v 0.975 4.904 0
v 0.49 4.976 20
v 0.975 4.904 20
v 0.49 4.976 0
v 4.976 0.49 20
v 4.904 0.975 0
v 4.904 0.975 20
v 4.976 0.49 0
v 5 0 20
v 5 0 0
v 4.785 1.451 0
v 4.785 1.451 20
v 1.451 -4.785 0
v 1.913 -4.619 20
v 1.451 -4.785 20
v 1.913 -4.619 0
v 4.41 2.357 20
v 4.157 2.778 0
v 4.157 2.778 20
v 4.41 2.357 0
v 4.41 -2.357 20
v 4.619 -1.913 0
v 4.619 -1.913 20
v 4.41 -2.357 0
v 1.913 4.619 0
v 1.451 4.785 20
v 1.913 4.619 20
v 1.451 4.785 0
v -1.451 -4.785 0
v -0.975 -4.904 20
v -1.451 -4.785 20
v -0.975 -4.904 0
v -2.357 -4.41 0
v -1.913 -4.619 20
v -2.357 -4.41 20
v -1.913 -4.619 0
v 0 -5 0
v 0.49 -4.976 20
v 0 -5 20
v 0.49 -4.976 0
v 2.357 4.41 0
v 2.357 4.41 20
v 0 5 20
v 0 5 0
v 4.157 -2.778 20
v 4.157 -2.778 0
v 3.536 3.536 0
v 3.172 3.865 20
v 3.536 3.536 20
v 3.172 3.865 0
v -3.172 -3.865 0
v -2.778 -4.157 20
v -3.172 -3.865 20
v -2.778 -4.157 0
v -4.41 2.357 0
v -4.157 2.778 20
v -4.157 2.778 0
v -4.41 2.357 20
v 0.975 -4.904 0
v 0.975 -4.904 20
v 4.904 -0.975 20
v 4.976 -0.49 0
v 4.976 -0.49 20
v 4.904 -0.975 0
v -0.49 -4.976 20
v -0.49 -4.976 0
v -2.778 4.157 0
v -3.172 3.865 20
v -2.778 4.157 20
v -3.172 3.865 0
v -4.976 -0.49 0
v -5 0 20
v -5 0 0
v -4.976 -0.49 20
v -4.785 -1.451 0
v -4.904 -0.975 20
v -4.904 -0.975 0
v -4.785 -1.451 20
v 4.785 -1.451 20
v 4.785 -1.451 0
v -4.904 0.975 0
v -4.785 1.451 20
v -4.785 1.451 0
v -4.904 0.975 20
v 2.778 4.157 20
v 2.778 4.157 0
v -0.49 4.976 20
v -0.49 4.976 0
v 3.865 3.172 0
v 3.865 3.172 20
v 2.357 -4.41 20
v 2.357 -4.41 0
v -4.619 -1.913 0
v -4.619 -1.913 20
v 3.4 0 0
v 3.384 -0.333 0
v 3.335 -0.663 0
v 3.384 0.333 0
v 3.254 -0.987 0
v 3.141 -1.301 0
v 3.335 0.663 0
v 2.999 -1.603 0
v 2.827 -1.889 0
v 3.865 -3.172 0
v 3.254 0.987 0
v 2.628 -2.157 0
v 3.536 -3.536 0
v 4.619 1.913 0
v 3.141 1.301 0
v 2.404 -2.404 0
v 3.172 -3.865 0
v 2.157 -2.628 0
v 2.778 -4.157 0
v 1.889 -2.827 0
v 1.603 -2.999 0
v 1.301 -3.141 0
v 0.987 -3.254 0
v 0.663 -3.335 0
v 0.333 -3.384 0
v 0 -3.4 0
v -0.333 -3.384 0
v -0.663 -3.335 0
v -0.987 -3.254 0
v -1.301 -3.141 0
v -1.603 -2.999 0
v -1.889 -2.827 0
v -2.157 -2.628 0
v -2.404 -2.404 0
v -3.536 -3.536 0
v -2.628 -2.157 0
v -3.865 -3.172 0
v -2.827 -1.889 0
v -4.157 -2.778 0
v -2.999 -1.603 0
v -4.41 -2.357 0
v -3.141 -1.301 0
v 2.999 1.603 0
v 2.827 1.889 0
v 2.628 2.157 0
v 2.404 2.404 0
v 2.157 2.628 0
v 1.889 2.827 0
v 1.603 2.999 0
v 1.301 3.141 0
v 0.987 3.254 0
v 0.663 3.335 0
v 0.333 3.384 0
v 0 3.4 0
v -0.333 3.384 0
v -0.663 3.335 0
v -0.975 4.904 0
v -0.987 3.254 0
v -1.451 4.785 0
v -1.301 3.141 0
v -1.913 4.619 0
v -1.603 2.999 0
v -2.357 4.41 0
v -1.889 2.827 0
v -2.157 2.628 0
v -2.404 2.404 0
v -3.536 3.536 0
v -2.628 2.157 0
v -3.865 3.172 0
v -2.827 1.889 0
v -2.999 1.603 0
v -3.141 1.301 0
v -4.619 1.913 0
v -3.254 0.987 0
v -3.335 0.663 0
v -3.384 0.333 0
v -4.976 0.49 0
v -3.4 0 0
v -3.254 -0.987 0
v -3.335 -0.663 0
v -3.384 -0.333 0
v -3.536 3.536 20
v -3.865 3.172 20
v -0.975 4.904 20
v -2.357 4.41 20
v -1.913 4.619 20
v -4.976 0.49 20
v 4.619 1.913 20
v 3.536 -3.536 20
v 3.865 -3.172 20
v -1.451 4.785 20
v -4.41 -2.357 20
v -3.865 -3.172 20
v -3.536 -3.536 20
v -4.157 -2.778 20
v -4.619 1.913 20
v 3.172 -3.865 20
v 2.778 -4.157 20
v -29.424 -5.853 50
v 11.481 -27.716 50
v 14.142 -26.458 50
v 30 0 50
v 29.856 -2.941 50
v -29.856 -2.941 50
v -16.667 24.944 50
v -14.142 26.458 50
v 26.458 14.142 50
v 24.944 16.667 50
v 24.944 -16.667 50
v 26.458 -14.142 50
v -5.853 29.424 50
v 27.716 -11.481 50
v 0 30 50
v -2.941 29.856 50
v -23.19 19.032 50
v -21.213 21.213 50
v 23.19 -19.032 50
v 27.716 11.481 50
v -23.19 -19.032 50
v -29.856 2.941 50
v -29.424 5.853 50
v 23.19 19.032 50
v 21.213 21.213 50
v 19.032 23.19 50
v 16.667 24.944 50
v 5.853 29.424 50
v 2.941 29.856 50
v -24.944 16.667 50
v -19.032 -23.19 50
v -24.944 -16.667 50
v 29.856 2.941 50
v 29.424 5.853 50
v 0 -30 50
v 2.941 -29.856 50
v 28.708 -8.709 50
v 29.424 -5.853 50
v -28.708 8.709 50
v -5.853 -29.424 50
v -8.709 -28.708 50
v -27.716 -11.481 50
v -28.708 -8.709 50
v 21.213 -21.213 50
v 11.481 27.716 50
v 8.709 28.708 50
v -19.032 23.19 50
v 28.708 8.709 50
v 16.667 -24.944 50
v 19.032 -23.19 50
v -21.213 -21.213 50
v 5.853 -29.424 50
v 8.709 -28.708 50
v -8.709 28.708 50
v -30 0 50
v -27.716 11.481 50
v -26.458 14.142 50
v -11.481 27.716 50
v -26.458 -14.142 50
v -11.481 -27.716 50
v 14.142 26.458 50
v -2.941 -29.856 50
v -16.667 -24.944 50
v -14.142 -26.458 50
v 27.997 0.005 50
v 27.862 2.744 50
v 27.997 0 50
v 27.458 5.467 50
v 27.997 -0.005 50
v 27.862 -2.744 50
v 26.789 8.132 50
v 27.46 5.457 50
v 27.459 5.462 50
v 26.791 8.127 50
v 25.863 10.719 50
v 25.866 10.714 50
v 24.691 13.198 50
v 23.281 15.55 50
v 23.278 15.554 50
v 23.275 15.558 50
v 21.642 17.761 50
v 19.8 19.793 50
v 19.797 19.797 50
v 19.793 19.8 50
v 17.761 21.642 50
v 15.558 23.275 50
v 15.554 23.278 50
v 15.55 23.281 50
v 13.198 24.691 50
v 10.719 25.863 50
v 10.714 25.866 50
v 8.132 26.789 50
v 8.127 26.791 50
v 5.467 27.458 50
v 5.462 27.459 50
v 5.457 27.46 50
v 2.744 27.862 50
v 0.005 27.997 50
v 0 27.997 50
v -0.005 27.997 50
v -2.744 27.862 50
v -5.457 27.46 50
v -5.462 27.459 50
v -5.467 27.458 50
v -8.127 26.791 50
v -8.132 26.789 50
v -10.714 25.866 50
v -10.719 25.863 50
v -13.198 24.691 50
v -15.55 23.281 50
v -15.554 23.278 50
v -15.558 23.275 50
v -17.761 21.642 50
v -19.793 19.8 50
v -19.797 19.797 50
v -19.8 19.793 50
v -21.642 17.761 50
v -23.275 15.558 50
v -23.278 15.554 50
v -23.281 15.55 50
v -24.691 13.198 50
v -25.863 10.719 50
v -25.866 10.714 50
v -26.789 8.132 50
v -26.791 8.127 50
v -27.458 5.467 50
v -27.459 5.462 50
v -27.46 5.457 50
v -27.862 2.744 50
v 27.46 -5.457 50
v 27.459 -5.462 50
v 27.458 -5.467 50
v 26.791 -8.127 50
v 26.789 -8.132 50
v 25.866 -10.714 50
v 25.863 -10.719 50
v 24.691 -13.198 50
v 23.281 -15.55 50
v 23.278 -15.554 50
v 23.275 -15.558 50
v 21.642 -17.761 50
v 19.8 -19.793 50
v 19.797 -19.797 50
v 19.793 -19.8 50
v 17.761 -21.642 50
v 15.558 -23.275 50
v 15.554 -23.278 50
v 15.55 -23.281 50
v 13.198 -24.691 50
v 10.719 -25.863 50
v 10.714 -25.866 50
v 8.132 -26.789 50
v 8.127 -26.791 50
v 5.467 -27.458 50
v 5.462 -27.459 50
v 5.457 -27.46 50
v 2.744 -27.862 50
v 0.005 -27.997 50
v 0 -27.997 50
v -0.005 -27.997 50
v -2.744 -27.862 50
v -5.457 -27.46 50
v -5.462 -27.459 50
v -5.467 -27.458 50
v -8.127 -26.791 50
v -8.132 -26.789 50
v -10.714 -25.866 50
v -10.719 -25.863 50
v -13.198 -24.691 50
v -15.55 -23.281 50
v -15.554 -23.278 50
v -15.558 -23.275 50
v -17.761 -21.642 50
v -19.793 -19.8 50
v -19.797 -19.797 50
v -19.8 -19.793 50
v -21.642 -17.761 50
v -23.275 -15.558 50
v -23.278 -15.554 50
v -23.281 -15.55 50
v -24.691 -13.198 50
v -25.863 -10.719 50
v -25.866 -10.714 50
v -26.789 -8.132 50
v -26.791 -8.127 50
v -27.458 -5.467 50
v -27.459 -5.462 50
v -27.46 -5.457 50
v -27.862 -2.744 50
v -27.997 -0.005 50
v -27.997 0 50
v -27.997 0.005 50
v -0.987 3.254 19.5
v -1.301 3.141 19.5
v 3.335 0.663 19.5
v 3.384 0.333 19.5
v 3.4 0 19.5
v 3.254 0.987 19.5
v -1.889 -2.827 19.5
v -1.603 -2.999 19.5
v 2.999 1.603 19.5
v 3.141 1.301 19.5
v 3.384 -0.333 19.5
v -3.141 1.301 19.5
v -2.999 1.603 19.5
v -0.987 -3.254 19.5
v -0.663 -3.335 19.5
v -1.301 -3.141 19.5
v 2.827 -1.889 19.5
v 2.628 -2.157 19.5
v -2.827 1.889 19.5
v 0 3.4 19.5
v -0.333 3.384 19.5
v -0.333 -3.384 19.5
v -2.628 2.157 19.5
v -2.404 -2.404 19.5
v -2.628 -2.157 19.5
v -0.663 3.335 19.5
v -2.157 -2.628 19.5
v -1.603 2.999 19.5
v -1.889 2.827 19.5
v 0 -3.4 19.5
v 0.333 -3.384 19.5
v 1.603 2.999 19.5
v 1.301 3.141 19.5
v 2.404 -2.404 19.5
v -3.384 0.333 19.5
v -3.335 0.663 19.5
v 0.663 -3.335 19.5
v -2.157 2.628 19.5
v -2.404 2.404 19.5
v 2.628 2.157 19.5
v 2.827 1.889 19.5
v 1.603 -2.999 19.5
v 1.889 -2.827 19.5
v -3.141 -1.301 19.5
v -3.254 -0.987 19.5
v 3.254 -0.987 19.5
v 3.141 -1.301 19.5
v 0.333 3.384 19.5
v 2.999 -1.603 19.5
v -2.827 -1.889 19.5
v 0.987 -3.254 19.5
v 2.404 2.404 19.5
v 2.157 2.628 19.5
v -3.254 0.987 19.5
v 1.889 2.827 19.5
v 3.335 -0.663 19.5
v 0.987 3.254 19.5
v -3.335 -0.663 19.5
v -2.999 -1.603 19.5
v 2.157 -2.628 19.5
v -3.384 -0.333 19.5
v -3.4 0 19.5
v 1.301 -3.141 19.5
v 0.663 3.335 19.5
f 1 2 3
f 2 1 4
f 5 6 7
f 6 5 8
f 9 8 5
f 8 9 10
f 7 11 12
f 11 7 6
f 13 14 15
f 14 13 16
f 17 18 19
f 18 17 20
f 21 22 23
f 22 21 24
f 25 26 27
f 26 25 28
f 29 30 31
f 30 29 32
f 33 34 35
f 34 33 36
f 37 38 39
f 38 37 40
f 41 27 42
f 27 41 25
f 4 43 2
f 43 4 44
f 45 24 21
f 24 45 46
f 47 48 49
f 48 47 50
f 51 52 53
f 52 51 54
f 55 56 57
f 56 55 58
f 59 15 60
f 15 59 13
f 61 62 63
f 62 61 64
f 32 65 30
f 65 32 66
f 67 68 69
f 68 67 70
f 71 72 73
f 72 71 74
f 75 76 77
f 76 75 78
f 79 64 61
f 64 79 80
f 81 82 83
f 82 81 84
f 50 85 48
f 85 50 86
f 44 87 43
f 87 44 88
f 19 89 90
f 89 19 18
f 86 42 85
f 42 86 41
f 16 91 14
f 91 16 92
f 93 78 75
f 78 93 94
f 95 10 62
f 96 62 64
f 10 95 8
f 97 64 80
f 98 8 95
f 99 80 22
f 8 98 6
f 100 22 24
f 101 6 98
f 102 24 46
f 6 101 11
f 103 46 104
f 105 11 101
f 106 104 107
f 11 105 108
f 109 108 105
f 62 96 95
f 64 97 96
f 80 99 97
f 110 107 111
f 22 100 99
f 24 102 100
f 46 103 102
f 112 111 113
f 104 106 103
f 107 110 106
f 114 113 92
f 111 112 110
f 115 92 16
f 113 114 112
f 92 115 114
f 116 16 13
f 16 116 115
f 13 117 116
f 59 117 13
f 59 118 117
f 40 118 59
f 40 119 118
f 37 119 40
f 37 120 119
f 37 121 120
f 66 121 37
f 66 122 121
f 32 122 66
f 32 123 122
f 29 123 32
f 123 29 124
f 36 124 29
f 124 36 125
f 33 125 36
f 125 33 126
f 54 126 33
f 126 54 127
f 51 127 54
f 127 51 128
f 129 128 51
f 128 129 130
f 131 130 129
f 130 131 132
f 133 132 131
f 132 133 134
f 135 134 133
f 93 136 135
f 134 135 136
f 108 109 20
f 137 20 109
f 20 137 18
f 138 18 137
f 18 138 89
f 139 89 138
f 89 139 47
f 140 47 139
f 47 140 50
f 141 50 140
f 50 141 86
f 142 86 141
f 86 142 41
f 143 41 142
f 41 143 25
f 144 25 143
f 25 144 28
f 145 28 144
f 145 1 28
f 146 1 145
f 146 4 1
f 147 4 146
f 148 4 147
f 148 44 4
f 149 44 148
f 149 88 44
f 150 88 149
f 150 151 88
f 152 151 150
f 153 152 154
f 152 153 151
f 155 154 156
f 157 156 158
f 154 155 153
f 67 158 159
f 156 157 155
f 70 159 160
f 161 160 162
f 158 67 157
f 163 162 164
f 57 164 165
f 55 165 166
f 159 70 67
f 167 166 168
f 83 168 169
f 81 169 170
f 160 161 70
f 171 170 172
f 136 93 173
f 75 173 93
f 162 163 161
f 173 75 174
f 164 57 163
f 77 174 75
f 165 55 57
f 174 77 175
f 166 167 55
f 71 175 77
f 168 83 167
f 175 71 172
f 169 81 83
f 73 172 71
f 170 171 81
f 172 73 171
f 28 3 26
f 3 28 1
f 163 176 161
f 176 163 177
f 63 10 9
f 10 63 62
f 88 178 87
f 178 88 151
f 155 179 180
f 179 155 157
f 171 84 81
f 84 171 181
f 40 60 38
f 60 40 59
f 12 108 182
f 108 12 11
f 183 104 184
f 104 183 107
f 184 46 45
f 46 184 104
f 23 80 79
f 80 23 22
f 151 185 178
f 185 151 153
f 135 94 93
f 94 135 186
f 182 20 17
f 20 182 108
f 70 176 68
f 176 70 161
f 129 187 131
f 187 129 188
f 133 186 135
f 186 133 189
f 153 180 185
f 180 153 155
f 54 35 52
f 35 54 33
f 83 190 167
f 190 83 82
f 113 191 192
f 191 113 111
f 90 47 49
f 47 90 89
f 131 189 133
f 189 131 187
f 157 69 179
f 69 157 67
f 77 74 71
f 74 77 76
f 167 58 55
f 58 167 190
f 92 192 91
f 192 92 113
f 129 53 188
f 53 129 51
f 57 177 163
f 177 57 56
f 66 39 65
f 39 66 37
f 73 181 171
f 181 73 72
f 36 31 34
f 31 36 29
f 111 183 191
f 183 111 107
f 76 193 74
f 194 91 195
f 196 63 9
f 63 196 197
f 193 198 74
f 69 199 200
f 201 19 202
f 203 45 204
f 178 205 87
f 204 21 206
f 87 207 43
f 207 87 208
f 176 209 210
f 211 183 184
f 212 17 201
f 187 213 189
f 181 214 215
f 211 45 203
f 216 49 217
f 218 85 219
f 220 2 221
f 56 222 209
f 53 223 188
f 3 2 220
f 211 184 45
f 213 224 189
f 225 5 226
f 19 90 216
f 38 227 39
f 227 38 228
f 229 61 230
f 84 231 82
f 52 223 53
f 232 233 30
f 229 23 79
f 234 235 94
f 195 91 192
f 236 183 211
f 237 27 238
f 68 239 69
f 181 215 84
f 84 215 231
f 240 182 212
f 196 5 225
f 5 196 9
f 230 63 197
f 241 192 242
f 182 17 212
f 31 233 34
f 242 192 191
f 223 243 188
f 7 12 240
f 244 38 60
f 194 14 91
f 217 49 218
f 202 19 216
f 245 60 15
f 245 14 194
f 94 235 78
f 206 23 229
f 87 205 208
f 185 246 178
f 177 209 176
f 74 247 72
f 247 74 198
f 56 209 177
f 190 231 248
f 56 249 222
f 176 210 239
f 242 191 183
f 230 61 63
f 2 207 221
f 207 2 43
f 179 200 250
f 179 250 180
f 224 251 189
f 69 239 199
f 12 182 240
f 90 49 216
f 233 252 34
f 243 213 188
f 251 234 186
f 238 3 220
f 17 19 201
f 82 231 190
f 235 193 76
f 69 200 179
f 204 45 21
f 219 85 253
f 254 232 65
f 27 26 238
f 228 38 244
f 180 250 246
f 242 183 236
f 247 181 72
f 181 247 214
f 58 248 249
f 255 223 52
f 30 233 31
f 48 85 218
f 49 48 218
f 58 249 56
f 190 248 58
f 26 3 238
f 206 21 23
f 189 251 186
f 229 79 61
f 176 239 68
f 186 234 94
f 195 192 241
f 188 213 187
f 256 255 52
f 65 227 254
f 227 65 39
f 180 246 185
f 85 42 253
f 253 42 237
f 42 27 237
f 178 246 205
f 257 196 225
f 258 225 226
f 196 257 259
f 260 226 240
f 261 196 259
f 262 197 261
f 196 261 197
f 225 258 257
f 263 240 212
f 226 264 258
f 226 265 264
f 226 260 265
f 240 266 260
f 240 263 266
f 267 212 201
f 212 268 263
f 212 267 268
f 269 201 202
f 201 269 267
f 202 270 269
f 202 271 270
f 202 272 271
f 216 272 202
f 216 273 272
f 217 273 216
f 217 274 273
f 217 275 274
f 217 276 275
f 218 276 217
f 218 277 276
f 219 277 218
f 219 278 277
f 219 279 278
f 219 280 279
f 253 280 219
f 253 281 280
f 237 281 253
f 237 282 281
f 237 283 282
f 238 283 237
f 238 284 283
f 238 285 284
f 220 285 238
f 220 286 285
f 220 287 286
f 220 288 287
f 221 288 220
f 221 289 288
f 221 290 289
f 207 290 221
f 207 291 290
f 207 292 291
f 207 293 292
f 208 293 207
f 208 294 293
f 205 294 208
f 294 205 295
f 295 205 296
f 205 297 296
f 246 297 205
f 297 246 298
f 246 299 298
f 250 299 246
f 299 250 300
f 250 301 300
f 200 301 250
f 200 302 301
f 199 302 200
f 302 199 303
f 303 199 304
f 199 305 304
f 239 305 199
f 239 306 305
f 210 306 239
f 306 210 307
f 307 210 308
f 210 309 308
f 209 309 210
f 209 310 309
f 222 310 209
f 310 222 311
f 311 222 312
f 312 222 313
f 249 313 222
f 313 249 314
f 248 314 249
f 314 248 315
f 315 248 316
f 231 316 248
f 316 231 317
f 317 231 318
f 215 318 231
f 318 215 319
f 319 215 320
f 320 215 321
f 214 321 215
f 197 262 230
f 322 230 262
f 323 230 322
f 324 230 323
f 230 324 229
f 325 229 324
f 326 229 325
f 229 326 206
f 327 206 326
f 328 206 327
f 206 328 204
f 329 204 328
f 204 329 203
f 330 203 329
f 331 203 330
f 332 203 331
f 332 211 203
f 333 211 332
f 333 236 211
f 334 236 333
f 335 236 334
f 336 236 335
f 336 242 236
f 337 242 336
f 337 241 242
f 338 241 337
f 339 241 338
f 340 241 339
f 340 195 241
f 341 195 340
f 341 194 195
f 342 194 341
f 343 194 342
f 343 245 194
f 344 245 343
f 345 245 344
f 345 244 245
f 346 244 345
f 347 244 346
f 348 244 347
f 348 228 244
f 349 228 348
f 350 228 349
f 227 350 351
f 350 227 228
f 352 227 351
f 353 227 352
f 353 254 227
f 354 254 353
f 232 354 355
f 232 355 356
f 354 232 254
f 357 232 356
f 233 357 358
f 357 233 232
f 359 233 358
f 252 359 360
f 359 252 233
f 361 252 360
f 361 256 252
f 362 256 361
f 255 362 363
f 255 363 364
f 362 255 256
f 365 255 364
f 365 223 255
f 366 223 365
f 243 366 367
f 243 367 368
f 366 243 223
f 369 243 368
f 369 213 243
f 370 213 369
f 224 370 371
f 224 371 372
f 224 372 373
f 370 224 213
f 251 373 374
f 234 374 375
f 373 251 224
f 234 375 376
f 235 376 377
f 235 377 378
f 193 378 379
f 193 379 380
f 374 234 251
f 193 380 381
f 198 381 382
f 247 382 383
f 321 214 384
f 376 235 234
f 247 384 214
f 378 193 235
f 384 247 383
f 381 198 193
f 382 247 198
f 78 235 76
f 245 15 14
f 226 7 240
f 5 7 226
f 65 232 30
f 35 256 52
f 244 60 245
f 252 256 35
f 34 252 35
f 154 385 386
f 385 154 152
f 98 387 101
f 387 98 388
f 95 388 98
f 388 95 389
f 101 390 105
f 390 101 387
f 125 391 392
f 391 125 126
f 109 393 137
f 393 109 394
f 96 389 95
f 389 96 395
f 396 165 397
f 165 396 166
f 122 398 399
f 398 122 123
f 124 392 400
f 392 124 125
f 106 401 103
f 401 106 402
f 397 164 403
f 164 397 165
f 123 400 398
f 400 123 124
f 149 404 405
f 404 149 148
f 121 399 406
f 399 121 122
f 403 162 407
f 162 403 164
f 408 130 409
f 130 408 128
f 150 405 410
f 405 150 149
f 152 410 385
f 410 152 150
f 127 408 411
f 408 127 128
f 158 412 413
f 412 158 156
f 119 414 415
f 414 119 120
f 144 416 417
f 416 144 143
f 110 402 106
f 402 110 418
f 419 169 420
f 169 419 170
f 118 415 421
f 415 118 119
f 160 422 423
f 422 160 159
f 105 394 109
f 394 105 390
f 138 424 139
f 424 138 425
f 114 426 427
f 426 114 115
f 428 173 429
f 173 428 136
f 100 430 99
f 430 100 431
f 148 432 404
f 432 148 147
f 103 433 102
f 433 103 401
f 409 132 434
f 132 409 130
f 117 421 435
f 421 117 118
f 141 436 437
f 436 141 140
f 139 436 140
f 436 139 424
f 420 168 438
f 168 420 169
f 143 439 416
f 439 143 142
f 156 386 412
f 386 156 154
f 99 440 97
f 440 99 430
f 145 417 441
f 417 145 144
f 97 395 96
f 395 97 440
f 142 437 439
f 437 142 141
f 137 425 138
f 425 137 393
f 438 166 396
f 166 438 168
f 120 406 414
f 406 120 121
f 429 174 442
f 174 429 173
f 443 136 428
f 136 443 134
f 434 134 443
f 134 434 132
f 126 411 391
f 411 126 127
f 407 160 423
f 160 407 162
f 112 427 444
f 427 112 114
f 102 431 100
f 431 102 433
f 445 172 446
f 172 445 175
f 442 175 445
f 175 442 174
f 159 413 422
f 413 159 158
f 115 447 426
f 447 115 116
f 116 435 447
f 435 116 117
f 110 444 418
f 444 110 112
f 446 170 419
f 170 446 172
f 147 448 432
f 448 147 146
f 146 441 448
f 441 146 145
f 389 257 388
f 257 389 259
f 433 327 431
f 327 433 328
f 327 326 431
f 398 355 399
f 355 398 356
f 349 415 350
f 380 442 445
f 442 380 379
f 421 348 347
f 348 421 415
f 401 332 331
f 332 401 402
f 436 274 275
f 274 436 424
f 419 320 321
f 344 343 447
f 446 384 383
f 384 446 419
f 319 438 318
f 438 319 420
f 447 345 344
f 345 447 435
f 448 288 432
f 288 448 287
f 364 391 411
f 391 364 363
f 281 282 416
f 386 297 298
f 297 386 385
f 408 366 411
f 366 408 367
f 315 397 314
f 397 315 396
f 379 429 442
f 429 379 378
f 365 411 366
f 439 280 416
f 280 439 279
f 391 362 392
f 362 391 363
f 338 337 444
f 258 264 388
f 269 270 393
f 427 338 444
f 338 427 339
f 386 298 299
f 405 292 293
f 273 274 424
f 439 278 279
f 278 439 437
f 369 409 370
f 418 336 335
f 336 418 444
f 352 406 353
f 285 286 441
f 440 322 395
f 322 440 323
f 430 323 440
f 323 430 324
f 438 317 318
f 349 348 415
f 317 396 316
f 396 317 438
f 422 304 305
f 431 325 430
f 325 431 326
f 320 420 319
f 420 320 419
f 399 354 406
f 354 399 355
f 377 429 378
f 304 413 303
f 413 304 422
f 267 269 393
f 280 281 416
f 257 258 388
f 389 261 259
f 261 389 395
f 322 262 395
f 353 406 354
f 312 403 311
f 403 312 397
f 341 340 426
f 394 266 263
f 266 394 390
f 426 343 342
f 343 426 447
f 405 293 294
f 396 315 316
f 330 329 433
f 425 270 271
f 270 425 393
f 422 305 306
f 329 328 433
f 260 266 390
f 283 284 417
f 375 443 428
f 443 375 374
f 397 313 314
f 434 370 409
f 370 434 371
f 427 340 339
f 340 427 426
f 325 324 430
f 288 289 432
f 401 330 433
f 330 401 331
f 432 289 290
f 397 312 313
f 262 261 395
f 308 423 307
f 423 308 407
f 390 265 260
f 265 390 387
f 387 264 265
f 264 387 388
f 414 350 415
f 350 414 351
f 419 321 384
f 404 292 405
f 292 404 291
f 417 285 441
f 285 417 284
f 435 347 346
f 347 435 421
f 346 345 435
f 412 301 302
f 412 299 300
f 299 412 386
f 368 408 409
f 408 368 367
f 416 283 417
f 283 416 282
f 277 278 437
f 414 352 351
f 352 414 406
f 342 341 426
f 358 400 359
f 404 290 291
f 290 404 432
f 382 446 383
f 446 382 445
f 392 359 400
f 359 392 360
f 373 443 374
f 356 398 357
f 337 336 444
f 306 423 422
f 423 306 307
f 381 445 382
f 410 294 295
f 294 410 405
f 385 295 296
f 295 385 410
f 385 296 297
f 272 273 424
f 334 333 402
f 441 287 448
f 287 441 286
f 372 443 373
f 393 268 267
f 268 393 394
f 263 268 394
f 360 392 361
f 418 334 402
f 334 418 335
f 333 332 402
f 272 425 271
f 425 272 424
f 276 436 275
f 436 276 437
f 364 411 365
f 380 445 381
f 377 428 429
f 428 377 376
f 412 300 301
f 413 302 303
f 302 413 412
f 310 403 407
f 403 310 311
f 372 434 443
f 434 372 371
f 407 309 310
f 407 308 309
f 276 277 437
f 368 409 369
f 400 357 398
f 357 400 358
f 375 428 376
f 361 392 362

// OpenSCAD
// Lab Funnel - OpenSCAD Model
// Dimensions measured in millimetres

// Spout dimensions
spout_outer_diameter = 10;       // Outer diameter of the spout (mm)
spout_inner_diameter = 6.8;      // Inner diameter (bore) of the spout (mm)
spout_height = 20;               // Height of the straight spout section (mm)

// Cone dimensions
cone_bottom_outer_diameter = 10; // Outer diameter at the base of the cone (matches spout) (mm)
cone_top_outer_diameter = 60;    // Outer diameter at the rim of the funnel (mm)
cone_height = 30;                // Height of the cone section (50 - 20 = 30 mm)

// Wall thickness
wall_thickness = 1.6;            // Uniform wall thickness (mm)

// Derived dimensions
cone_bottom_inner_diameter = cone_bottom_outer_diameter - 2 * wall_thickness; // 6.8 mm
cone_top_inner_diameter = cone_top_outer_diameter - 2 * wall_thickness;       // 56.8 mm

// Resolution for curved shapes
$fn = 64;

// Build the funnel in print orientation: spout at bottom (z=0), cone above, open at top and bottom
difference() {
    // Solid outer shape: spout cylinder + cone
    union() {
        // Spout: solid cylinder from z=0 to z=spout_height
        translate([0, 0, 0])
            cylinder(h = spout_height, r = spout_outer_diameter / 2, center = false);
        
        // Cone: solid cone from z=spout_height to z=spout_height+cone_height
        translate([0, 0, spout_height])
            cylinder(h = cone_height, r1 = cone_bottom_outer_diameter / 2, r2 = cone_top_outer_diameter / 2, center = false);
    }
    
    // Hollow out the interior: spout bore + cone bore
    // Extend cuts slightly past boundaries to avoid coplanar faces
    union() {
        // Spout bore: cylinder from z=-0.5 to z=spout_height+0.5
        translate([0, 0, -0.5])
            cylinder(h = spout_height + 1, r = spout_inner_diameter / 2, center = false);
        
        // Cone bore: cone from z=spout_height-0.5 to z=spout_height+cone_height+0.5
        translate([0, 0, spout_height - 0.5])
            cylinder(h = cone_height + 1, r1 = cone_bottom_inner_diameter / 2, r2 = cone_top_inner_diameter / 2, center = false);
    }
}
